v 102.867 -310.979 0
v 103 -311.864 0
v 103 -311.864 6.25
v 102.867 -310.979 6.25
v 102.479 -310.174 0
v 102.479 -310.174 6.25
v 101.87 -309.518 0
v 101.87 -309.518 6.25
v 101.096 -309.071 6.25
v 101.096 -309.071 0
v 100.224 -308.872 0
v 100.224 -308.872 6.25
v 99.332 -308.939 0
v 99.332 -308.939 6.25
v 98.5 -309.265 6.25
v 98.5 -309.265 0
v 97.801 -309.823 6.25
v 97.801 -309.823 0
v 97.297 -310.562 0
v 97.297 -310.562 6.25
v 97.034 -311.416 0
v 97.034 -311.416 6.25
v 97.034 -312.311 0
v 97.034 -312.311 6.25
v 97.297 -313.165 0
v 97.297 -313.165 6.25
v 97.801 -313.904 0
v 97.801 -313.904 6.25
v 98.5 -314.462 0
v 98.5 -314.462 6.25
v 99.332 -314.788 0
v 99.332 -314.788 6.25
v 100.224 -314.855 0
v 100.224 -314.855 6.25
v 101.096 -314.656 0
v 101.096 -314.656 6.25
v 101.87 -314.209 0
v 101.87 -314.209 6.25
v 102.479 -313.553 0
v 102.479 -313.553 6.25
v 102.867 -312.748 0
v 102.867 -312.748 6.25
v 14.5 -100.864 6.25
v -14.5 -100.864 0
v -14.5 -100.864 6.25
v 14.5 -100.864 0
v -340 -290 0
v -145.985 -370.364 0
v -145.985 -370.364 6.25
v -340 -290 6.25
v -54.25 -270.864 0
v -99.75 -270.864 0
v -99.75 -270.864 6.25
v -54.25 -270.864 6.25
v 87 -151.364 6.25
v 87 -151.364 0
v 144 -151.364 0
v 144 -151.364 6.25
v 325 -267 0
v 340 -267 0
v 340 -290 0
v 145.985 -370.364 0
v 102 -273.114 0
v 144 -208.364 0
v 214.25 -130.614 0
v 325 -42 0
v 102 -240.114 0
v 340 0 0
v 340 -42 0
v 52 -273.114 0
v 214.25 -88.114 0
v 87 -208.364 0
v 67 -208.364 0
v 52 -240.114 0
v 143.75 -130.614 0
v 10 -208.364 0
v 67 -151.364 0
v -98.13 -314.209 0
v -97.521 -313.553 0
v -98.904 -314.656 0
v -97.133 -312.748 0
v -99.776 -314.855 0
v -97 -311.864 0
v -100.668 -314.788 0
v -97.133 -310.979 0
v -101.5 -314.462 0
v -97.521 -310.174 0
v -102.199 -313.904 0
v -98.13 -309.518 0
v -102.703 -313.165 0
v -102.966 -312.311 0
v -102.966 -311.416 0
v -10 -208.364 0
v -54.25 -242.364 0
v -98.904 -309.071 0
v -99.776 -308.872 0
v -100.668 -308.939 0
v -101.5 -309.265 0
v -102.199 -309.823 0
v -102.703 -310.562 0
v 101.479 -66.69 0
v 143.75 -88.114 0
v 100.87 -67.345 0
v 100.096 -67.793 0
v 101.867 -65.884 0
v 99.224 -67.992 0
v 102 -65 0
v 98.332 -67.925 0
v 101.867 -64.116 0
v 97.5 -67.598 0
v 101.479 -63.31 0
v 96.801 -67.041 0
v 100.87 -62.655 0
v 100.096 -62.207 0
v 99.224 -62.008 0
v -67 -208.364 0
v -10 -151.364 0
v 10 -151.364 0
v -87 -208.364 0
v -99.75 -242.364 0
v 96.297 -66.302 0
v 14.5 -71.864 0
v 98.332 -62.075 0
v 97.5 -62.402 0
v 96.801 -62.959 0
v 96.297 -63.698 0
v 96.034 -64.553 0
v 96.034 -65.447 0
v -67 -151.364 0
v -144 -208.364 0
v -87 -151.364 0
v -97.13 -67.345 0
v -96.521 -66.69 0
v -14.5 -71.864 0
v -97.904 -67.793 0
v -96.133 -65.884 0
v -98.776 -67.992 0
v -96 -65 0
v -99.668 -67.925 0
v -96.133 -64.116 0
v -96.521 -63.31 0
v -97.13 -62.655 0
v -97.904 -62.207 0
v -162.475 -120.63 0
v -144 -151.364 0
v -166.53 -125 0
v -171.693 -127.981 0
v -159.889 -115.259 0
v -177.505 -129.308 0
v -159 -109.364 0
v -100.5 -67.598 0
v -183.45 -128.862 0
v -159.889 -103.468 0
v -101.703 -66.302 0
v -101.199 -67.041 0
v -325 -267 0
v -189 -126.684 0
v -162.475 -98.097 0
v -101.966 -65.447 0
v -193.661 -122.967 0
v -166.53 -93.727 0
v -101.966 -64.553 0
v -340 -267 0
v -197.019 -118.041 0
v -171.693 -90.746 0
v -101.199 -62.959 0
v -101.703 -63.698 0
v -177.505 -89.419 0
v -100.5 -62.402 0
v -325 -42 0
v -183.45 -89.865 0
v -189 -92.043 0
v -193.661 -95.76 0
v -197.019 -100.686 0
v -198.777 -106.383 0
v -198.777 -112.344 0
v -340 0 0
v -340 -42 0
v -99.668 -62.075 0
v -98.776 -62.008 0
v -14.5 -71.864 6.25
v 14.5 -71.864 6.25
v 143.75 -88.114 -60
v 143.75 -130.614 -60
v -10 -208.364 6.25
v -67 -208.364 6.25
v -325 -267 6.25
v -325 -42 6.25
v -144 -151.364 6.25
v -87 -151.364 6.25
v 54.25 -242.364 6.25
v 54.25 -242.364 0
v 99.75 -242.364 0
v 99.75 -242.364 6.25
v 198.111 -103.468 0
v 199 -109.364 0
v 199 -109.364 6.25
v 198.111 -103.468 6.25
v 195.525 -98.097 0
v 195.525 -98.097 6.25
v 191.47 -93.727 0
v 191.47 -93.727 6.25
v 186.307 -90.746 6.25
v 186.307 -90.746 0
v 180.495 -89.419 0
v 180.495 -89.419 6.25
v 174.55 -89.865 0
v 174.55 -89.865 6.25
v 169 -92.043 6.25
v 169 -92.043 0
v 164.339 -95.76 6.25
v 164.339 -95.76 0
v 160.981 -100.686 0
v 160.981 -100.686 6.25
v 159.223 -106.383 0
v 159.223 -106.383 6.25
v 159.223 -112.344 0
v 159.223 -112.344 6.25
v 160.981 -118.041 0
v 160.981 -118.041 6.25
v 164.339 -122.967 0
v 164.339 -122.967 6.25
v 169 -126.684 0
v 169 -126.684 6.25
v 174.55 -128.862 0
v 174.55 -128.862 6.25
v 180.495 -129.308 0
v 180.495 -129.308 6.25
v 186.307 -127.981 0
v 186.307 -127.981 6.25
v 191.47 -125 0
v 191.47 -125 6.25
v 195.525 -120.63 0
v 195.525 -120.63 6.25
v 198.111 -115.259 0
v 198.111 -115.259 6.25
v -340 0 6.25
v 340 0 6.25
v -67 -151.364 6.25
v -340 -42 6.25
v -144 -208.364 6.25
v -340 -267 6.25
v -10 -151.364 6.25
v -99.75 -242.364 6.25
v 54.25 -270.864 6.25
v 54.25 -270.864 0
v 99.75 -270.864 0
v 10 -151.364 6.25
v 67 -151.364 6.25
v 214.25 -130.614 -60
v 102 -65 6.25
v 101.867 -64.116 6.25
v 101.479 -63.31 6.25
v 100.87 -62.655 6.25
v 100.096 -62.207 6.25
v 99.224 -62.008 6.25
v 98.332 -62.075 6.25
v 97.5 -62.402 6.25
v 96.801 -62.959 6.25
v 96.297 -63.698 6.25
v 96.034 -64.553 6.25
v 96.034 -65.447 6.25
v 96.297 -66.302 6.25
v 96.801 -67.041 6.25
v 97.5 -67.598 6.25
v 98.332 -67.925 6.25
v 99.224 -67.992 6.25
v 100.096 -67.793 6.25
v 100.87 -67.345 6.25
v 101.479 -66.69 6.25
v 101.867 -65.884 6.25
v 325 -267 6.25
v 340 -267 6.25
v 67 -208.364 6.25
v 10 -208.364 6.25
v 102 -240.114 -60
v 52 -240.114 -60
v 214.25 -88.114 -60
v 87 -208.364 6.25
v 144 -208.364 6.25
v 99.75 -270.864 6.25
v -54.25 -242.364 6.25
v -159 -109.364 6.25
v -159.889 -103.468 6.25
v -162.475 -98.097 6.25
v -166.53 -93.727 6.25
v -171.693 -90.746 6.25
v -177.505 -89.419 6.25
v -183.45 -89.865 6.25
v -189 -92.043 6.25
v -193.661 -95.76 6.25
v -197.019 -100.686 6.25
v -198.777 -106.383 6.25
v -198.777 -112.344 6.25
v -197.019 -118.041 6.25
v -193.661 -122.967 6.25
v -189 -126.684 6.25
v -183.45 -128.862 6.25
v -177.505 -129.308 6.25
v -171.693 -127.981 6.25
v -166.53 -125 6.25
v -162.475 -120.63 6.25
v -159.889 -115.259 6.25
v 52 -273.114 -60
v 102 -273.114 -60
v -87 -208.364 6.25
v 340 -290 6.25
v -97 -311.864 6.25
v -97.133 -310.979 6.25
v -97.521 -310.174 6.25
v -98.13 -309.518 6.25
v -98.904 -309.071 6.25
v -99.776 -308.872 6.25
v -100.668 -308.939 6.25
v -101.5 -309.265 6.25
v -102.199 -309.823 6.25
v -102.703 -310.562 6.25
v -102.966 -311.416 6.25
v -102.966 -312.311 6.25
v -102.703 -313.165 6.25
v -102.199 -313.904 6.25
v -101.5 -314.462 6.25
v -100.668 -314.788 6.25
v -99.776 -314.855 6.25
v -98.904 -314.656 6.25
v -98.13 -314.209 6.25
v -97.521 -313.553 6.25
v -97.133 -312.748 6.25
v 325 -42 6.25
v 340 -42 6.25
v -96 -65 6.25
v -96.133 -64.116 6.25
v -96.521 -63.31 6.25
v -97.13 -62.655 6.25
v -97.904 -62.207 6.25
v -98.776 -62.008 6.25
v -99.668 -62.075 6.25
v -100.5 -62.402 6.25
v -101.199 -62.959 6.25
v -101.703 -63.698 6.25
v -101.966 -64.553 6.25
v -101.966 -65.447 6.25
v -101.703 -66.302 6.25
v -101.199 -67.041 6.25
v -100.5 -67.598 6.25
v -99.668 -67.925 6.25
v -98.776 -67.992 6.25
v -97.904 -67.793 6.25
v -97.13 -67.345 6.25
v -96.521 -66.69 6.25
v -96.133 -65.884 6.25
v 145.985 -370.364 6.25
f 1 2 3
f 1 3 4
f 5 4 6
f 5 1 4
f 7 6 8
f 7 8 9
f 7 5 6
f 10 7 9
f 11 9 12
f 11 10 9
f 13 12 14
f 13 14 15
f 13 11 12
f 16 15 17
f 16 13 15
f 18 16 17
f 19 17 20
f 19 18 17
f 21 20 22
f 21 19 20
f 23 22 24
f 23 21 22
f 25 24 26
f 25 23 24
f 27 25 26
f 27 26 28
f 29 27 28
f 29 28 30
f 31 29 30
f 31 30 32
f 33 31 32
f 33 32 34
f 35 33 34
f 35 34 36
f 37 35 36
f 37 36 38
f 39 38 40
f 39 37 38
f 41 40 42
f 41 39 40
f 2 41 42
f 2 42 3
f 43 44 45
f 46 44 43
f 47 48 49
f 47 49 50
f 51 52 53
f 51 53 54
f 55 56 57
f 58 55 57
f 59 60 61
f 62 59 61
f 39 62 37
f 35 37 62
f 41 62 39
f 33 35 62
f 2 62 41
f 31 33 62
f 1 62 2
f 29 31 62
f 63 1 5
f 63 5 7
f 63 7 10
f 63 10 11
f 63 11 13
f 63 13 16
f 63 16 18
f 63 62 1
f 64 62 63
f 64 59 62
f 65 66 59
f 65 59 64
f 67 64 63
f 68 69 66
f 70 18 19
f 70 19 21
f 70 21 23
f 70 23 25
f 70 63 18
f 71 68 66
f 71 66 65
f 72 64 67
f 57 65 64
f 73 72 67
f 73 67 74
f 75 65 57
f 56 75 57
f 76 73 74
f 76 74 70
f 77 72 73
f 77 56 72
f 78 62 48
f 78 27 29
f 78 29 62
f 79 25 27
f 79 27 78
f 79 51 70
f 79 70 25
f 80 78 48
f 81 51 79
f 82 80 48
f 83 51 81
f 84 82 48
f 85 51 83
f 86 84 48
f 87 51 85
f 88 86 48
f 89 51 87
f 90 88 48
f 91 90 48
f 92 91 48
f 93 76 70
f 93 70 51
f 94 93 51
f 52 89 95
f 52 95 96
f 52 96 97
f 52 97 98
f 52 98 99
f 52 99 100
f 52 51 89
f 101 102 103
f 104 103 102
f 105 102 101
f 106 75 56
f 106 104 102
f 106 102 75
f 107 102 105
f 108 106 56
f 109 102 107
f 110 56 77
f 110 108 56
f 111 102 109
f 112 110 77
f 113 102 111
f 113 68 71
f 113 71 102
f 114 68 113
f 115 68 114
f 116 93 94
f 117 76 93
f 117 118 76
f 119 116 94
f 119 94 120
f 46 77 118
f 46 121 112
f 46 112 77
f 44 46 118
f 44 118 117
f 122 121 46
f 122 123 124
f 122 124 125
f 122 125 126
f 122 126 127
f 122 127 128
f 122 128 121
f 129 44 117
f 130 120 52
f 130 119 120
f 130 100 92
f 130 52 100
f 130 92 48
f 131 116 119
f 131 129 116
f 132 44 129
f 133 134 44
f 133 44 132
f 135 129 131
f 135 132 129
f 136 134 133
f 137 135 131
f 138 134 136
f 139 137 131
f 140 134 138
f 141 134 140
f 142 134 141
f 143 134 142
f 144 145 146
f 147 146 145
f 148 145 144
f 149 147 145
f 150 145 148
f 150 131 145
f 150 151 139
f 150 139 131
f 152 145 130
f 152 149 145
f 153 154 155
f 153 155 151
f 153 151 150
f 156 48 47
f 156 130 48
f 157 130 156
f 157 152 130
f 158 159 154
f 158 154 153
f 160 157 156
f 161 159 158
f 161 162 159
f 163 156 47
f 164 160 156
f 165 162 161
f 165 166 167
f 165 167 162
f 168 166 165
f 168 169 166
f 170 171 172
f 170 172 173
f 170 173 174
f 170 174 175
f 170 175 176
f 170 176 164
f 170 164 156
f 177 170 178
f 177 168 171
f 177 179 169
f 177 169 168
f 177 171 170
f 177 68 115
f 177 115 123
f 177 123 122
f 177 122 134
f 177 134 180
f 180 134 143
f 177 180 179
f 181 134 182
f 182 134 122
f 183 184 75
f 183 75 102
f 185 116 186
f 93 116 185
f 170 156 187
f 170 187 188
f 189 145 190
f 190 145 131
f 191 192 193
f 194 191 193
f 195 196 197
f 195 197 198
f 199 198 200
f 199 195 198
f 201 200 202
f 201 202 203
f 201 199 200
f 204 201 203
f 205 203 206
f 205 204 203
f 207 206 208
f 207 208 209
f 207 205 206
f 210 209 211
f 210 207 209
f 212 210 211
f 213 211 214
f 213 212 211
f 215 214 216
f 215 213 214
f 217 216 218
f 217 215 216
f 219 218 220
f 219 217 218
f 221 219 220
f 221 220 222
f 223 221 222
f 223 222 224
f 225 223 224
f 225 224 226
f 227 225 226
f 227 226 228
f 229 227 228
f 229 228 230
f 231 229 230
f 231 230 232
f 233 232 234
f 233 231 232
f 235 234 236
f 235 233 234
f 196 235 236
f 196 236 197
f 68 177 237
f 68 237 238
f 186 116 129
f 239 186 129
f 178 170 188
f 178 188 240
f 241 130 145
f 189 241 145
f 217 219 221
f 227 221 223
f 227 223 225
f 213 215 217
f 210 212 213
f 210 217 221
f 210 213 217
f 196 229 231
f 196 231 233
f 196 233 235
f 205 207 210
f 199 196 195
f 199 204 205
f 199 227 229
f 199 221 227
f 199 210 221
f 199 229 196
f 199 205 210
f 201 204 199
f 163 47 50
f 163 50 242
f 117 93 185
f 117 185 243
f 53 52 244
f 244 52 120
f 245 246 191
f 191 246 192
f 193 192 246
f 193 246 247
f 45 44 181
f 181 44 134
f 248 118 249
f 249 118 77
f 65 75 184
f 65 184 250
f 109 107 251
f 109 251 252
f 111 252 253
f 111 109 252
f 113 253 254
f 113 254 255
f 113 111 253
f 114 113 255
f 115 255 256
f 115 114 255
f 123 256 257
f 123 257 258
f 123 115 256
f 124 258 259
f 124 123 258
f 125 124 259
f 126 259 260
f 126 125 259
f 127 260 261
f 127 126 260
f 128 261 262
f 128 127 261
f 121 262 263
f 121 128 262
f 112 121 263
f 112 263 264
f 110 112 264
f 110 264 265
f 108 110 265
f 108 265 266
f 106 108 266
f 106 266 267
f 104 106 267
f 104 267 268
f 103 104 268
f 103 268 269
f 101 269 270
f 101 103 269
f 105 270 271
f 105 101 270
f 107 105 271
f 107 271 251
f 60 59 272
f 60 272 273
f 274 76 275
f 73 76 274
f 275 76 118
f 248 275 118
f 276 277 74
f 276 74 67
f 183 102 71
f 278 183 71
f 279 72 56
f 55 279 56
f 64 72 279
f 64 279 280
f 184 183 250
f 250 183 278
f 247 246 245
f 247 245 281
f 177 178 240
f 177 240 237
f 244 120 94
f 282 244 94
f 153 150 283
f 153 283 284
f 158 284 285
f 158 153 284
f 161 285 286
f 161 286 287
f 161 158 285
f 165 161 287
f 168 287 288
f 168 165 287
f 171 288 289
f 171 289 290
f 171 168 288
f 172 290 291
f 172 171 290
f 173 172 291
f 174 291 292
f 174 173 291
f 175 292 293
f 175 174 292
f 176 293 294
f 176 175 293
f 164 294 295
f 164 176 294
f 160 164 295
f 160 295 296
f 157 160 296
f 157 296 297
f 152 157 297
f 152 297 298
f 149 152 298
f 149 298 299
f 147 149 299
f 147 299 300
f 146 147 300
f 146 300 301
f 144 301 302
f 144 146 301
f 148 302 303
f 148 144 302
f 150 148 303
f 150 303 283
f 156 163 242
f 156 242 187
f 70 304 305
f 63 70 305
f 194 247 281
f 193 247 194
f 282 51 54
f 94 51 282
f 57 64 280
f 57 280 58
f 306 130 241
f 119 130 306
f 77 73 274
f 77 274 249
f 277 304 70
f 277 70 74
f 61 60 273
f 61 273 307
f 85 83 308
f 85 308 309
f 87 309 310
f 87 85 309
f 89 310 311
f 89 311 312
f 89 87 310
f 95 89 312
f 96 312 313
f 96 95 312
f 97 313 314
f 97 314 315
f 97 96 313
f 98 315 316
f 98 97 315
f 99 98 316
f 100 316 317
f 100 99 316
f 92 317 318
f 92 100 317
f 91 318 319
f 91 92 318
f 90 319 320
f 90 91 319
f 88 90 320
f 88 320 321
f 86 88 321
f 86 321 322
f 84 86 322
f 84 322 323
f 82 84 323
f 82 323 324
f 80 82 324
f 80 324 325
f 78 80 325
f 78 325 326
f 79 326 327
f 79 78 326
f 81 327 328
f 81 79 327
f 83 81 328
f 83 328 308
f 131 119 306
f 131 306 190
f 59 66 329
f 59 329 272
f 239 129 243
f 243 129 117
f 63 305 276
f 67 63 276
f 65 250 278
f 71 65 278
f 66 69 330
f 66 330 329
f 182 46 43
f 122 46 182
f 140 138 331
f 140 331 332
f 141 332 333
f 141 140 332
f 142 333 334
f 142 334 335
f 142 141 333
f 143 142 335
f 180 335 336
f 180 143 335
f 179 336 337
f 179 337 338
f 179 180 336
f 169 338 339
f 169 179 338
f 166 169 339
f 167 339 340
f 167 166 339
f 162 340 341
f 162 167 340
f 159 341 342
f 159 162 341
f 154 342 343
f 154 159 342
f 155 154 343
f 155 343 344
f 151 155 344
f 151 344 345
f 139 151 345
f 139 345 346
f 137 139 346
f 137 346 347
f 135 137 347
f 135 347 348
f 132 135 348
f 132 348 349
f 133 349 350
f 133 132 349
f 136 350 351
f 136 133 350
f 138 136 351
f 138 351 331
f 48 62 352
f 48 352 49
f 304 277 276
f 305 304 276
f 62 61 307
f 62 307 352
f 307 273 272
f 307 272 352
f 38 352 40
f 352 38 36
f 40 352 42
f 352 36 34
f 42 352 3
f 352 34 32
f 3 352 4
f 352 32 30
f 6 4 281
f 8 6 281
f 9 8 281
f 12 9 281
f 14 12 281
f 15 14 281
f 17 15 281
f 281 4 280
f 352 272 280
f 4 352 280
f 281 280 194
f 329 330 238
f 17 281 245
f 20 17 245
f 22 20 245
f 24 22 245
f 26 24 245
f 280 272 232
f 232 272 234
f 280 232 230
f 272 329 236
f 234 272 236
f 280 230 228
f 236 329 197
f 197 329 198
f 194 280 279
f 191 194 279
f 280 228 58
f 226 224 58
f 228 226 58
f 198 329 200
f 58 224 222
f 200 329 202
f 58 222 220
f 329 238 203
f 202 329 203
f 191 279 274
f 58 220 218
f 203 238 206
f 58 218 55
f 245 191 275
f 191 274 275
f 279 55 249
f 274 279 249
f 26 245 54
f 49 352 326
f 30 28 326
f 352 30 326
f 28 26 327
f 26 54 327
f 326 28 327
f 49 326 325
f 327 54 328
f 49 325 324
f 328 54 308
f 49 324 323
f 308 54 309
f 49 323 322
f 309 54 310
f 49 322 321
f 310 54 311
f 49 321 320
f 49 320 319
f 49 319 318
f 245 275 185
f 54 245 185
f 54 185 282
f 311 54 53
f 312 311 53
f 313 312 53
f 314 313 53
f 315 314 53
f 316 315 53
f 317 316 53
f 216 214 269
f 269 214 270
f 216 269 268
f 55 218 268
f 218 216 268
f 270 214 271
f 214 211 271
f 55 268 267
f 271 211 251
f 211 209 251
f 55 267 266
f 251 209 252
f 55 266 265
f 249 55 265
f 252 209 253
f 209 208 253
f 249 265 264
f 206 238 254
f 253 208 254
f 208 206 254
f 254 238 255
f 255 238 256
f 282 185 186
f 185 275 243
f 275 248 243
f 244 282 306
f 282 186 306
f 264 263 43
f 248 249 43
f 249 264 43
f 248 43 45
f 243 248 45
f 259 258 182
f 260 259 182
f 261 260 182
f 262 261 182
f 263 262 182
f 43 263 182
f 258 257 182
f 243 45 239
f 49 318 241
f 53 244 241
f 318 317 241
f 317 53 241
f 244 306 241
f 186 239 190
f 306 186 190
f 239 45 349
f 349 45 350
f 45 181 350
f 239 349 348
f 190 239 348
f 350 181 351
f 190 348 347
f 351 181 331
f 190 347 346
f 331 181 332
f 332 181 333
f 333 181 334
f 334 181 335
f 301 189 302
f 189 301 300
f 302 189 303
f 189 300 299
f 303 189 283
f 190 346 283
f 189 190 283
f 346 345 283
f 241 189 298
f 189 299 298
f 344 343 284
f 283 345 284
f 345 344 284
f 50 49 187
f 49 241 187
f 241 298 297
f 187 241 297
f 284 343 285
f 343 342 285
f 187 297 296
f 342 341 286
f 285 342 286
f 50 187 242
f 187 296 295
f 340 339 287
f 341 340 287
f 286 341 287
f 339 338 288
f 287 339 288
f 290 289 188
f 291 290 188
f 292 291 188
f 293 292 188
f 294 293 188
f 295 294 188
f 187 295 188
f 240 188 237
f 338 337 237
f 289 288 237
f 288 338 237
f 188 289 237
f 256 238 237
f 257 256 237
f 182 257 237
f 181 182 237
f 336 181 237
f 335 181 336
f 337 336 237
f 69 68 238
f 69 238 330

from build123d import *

# Parameters (mm, degrees)
SKETCH1_R           = 20
SKETCH1_R_2         = 3
SKETCH1_W           = 57
SKETCH1_H           = 57
SKETCH1_W_2         = 45.5
SKETCH1_H_2         = 28.5
SKETCH1_W_3         = 29
SKETCH1_H_3         = 29
BOSS_EXTRUDE1_DEPTH = 6.25
SKETCH2_W           = 70.5
SKETCH2_H           = 42.5
SKETCH2_W_2         = 50
SKETCH2_H_2         = 33
BOSS_EXTRUDE2_DEPTH = 60


with BuildPart() as part:
    # Sketch1 → Boss-Extrude1 (new body)
    with BuildSketch(Plane.XY):
        Polygon((-340, 0), (340, 0), (340, -42), (325, -42), (325, -267), (340, -267), (340, -290), (145.985298173, -370.363520797), (-145.985298173, -370.363520797), (-340, -290), (-340, -267), (-325, -267), (-325, -42), (-340, -42), align=None)
        with Locations((-179, -109.363520797)):
            Circle(SKETCH1_R, mode=Mode.SUBTRACT)
        with Locations((179, -109.363520797)):
            Circle(SKETCH1_R, mode=Mode.SUBTRACT)
        with Locations((-99, -65)):
            Circle(SKETCH1_R_2, mode=Mode.SUBTRACT)
        with Locations((-100, -311.863520797)):
            Circle(SKETCH1_R_2, mode=Mode.SUBTRACT)
        with Locations((99, -65)):
            Circle(SKETCH1_R_2, mode=Mode.SUBTRACT)
        with Locations((100, -311.863520797)):
            Circle(SKETCH1_R_2, mode=Mode.SUBTRACT)
        with Locations((-115.5, -179.863520797)):
            Rectangle(SKETCH1_W, SKETCH1_H, mode=Mode.SUBTRACT)
        with Locations((-38.5, -179.863520797)):
            Rectangle(SKETCH1_W, SKETCH1_H, mode=Mode.SUBTRACT)
        with Locations((38.5, -179.863520797)):
            Rectangle(SKETCH1_W, SKETCH1_H, mode=Mode.SUBTRACT)
        with Locations((115.5, -179.863520797)):
            Rectangle(SKETCH1_W, SKETCH1_H, mode=Mode.SUBTRACT)
        with Locations((-77, -256.613520797)):
            Rectangle(SKETCH1_W_2, SKETCH1_H_2, mode=Mode.SUBTRACT)
        with Locations((77, -256.613520797)):
            Rectangle(SKETCH1_W_2, SKETCH1_H_2, mode=Mode.SUBTRACT)
        with Locations((0, -86.363520797)):
            Rectangle(SKETCH1_W_3, SKETCH1_H_3, mode=Mode.SUBTRACT)
    extrude(amount=BOSS_EXTRUDE1_DEPTH)

    # Sketch2 → Boss-Extrude2 (add)
    with BuildSketch(Plane.XY):
        with Locations((179, -109.363520797)):
            Rectangle(SKETCH2_W, SKETCH2_H)
        with Locations((77, -256.613520797)):
            Rectangle(SKETCH2_W_2, SKETCH2_H_2)
    extrude(amount=-BOSS_EXTRUDE2_DEPTH)


solid = part.part
